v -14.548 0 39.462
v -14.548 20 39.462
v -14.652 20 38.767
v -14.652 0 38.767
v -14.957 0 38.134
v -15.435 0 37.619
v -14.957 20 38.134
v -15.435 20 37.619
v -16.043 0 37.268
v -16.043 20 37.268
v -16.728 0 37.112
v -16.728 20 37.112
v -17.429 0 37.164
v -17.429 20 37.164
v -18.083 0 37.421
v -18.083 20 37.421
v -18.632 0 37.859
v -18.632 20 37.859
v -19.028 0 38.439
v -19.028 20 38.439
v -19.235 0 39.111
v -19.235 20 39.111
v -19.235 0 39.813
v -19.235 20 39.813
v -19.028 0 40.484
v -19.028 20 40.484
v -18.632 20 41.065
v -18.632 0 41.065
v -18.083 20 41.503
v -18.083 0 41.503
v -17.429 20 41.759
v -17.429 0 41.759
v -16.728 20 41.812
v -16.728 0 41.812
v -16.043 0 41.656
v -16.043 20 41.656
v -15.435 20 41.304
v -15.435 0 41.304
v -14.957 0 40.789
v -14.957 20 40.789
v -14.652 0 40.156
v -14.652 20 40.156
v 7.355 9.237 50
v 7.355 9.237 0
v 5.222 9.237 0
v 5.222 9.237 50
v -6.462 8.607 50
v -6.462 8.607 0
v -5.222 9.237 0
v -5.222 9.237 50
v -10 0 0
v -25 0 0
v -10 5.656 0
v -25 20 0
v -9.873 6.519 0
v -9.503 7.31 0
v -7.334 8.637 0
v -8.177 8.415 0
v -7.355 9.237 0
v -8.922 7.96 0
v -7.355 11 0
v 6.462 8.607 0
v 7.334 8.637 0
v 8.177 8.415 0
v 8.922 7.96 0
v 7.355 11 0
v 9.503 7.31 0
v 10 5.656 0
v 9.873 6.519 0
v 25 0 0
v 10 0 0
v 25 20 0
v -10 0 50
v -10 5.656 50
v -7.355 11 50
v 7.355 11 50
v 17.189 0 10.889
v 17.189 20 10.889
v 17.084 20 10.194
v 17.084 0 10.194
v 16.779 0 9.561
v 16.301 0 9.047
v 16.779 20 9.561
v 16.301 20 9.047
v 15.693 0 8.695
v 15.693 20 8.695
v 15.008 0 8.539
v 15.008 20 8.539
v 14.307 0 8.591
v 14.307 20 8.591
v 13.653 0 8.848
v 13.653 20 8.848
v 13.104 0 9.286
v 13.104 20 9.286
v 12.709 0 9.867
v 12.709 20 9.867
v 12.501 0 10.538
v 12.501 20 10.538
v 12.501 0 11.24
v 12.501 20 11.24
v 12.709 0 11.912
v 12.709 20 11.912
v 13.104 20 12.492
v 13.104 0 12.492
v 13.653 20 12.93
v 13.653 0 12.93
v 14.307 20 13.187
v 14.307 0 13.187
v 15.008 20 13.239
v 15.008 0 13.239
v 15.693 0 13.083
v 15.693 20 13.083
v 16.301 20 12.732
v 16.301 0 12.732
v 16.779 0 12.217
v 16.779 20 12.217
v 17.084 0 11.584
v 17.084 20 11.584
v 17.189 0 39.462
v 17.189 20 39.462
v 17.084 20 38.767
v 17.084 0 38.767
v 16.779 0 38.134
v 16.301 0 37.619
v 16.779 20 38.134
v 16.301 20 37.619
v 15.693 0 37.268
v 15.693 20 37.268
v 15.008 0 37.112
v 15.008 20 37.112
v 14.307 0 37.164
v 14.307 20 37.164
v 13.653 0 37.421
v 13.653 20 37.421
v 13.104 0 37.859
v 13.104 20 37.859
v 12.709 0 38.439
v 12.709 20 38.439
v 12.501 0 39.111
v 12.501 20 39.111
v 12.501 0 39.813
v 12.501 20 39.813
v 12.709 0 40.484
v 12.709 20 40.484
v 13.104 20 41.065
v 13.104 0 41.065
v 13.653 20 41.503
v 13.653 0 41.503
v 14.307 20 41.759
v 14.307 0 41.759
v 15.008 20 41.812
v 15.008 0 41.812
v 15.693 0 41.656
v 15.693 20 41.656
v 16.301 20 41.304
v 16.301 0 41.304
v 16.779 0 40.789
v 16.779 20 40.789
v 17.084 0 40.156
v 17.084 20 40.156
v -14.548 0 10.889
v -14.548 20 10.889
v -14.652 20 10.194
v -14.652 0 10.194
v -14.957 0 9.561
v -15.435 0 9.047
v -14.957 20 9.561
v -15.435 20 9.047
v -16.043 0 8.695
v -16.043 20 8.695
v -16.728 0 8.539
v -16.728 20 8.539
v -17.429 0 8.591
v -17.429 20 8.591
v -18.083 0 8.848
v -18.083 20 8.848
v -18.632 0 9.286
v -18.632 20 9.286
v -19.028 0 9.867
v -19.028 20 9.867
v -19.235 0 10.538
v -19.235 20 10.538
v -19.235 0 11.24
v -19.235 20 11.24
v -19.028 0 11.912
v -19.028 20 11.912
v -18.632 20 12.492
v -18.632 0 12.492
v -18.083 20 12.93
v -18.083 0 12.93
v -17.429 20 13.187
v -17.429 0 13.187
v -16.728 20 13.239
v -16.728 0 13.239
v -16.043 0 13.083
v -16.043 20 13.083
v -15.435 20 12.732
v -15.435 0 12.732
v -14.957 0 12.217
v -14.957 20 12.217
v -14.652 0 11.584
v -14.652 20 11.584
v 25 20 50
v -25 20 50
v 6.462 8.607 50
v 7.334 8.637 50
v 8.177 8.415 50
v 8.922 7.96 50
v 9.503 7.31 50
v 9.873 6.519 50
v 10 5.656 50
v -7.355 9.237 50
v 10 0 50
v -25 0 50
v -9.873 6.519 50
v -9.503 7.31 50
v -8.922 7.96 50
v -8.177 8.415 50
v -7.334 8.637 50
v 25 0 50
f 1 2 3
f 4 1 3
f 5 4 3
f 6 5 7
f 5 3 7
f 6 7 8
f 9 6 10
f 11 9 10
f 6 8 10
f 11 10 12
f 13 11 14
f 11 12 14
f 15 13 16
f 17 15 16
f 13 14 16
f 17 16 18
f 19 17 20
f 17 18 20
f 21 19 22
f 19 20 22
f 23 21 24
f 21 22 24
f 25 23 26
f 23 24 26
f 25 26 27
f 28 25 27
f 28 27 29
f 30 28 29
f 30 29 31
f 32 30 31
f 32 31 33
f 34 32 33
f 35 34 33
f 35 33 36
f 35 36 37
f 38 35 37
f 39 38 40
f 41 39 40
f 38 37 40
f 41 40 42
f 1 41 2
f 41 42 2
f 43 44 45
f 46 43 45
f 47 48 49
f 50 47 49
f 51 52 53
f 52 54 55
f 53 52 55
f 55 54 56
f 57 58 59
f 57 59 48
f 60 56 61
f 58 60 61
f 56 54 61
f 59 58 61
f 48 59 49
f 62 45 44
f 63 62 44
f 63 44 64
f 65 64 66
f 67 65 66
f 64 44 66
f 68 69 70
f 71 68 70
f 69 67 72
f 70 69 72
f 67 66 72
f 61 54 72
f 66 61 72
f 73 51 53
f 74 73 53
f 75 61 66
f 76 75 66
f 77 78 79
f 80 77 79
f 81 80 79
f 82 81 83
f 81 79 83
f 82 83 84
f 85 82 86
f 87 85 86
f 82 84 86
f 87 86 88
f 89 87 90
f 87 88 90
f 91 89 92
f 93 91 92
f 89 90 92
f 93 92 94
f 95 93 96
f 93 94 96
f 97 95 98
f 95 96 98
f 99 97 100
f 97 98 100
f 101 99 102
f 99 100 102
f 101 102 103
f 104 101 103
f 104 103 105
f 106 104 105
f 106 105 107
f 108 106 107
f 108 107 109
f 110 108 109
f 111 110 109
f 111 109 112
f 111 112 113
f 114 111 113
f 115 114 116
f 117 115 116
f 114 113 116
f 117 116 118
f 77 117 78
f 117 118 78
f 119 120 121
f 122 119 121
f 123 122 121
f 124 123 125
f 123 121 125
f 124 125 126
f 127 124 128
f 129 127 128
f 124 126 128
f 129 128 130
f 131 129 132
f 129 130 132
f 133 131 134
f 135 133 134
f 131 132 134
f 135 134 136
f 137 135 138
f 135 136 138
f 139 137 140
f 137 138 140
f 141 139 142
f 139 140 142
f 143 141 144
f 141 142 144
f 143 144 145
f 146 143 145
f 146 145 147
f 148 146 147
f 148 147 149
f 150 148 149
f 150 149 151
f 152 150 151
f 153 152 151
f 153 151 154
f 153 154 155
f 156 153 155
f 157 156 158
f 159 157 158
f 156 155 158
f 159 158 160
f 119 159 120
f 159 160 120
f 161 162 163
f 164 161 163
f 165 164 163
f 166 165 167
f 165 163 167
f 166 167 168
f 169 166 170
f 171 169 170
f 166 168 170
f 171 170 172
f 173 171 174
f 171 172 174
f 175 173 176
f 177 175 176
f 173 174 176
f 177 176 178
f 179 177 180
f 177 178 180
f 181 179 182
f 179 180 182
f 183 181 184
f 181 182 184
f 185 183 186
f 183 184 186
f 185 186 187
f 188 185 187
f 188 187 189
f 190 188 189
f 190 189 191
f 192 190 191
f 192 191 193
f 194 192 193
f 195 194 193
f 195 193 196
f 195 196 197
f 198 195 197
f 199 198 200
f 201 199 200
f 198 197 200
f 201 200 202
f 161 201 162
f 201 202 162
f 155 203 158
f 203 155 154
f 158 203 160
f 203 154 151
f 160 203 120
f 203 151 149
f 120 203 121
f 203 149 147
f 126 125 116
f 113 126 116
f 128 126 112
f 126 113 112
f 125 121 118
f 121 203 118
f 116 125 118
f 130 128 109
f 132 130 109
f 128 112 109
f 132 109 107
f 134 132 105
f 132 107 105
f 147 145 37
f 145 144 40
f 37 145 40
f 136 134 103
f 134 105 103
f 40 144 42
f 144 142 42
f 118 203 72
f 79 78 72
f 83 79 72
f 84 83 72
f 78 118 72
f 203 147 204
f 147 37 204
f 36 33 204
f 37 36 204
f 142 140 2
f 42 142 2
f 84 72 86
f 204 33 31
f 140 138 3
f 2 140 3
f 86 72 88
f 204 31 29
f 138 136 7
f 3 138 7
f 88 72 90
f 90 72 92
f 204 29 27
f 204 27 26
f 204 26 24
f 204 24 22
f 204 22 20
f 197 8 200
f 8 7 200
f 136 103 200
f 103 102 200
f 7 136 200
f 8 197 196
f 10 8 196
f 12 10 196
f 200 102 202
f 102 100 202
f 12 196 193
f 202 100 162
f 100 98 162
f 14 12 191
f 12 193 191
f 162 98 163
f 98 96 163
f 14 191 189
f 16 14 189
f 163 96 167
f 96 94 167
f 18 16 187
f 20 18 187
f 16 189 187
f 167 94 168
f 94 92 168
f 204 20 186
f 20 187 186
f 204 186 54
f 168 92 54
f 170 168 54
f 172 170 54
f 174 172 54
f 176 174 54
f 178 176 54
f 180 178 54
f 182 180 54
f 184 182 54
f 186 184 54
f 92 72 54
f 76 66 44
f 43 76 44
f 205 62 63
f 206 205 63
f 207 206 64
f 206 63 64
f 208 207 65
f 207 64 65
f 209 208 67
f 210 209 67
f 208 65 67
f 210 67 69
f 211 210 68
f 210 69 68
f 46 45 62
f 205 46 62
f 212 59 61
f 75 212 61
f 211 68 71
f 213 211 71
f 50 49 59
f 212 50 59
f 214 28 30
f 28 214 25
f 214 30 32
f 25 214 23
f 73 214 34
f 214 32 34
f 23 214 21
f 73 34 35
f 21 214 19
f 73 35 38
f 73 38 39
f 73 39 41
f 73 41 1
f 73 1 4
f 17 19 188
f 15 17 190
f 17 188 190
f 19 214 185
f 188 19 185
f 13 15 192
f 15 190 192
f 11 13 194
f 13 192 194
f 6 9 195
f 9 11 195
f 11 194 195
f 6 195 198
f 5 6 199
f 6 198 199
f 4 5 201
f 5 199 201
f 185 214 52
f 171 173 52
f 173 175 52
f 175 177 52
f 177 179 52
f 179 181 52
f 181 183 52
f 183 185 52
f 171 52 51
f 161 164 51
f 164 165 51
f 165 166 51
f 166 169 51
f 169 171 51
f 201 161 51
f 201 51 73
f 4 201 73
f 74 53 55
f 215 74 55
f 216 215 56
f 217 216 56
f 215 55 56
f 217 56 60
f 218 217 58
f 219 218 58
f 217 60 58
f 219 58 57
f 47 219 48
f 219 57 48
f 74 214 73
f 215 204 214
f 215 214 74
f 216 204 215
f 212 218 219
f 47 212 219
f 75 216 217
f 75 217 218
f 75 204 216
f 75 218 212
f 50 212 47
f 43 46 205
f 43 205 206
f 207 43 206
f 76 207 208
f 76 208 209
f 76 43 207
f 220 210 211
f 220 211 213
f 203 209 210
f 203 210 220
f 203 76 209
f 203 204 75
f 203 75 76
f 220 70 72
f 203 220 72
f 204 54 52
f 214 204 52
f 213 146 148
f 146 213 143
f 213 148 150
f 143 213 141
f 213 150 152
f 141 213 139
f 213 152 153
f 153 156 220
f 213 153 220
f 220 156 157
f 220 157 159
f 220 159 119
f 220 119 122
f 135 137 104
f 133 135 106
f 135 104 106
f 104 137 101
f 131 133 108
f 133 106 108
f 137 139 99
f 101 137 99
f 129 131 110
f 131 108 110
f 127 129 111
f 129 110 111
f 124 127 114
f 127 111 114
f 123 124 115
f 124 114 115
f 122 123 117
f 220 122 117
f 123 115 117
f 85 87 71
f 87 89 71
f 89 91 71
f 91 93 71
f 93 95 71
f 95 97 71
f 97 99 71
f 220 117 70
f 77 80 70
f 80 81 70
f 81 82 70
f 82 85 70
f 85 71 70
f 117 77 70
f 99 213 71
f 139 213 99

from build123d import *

# Parameters (mm, degrees)
SALIENTE_EXTRUIR1_DEPTH = 50
CROQUIS2_R              = 2.35674785
CORTAR_EXTRUIR1_DEPTH   = 20


with BuildPart() as part:
    # Croquis1 → Saliente-Extruir1 (new body)
    with BuildSketch(Plane.XY):
        with BuildLine():
            Line((-10, 0), (-10, 5.656056356))
            ThreePointArc((-10, 5.656056356), (-8.921539569, 7.959897862), (-6.461542876, 8.607338099))
            Line((-6.461542876, 8.607338099), (-5.221744043, 9.236902282))
            Line((-5.221744043, 9.236902282), (-7.354818693, 9.236902282))
            Line((-7.354818693, 9.236902282), (-7.354818693, 11))
            Line((-7.354818693, 11), (7.354818693, 11))
            Line((7.354818693, 11), (7.354818693, 9.236902282))
            Line((7.354818693, 9.236902282), (5.221744043, 9.236902282))
            Line((5.221744043, 9.236902282), (6.461542876, 8.607338099))
            ThreePointArc((6.461542876, 8.607338099), (8.921539569, 7.959897862), (10, 5.656056356))
            Line((10, 5.656056356), (10, 0))
            Line((10, 0), (25, 0))
            Line((25, 0), (25, 20))
            Line((25, 20), (-25, 20))
            Line((-25, 20), (-25, 0))
            Line((-25, 0), (-10, 0))
        make_face()
    extrude(amount=SALIENTE_EXTRUIR1_DEPTH)

    # Croquis2 → Cortar-Extruir1 (cut)
    with BuildSketch(Plane(origin=(0, 20, 0), x_dir=(1, 0, 0), z_dir=(0, 1, 0))):
        with Locations((14.831866676, -10.889102432)):
            Circle(CROQUIS2_R)
        with Locations((14.831866676, -39.461784116)):
            Circle(CROQUIS2_R)
        with Locations((-16.904414288, -39.461784116)):
            Circle(CROQUIS2_R)
        with Locations((-16.904414288, -10.889102432)):
            Circle(CROQUIS2_R)
    extrude(amount=-CORTAR_EXTRUIR1_DEPTH, mode=Mode.SUBTRACT)


solid = part.part
